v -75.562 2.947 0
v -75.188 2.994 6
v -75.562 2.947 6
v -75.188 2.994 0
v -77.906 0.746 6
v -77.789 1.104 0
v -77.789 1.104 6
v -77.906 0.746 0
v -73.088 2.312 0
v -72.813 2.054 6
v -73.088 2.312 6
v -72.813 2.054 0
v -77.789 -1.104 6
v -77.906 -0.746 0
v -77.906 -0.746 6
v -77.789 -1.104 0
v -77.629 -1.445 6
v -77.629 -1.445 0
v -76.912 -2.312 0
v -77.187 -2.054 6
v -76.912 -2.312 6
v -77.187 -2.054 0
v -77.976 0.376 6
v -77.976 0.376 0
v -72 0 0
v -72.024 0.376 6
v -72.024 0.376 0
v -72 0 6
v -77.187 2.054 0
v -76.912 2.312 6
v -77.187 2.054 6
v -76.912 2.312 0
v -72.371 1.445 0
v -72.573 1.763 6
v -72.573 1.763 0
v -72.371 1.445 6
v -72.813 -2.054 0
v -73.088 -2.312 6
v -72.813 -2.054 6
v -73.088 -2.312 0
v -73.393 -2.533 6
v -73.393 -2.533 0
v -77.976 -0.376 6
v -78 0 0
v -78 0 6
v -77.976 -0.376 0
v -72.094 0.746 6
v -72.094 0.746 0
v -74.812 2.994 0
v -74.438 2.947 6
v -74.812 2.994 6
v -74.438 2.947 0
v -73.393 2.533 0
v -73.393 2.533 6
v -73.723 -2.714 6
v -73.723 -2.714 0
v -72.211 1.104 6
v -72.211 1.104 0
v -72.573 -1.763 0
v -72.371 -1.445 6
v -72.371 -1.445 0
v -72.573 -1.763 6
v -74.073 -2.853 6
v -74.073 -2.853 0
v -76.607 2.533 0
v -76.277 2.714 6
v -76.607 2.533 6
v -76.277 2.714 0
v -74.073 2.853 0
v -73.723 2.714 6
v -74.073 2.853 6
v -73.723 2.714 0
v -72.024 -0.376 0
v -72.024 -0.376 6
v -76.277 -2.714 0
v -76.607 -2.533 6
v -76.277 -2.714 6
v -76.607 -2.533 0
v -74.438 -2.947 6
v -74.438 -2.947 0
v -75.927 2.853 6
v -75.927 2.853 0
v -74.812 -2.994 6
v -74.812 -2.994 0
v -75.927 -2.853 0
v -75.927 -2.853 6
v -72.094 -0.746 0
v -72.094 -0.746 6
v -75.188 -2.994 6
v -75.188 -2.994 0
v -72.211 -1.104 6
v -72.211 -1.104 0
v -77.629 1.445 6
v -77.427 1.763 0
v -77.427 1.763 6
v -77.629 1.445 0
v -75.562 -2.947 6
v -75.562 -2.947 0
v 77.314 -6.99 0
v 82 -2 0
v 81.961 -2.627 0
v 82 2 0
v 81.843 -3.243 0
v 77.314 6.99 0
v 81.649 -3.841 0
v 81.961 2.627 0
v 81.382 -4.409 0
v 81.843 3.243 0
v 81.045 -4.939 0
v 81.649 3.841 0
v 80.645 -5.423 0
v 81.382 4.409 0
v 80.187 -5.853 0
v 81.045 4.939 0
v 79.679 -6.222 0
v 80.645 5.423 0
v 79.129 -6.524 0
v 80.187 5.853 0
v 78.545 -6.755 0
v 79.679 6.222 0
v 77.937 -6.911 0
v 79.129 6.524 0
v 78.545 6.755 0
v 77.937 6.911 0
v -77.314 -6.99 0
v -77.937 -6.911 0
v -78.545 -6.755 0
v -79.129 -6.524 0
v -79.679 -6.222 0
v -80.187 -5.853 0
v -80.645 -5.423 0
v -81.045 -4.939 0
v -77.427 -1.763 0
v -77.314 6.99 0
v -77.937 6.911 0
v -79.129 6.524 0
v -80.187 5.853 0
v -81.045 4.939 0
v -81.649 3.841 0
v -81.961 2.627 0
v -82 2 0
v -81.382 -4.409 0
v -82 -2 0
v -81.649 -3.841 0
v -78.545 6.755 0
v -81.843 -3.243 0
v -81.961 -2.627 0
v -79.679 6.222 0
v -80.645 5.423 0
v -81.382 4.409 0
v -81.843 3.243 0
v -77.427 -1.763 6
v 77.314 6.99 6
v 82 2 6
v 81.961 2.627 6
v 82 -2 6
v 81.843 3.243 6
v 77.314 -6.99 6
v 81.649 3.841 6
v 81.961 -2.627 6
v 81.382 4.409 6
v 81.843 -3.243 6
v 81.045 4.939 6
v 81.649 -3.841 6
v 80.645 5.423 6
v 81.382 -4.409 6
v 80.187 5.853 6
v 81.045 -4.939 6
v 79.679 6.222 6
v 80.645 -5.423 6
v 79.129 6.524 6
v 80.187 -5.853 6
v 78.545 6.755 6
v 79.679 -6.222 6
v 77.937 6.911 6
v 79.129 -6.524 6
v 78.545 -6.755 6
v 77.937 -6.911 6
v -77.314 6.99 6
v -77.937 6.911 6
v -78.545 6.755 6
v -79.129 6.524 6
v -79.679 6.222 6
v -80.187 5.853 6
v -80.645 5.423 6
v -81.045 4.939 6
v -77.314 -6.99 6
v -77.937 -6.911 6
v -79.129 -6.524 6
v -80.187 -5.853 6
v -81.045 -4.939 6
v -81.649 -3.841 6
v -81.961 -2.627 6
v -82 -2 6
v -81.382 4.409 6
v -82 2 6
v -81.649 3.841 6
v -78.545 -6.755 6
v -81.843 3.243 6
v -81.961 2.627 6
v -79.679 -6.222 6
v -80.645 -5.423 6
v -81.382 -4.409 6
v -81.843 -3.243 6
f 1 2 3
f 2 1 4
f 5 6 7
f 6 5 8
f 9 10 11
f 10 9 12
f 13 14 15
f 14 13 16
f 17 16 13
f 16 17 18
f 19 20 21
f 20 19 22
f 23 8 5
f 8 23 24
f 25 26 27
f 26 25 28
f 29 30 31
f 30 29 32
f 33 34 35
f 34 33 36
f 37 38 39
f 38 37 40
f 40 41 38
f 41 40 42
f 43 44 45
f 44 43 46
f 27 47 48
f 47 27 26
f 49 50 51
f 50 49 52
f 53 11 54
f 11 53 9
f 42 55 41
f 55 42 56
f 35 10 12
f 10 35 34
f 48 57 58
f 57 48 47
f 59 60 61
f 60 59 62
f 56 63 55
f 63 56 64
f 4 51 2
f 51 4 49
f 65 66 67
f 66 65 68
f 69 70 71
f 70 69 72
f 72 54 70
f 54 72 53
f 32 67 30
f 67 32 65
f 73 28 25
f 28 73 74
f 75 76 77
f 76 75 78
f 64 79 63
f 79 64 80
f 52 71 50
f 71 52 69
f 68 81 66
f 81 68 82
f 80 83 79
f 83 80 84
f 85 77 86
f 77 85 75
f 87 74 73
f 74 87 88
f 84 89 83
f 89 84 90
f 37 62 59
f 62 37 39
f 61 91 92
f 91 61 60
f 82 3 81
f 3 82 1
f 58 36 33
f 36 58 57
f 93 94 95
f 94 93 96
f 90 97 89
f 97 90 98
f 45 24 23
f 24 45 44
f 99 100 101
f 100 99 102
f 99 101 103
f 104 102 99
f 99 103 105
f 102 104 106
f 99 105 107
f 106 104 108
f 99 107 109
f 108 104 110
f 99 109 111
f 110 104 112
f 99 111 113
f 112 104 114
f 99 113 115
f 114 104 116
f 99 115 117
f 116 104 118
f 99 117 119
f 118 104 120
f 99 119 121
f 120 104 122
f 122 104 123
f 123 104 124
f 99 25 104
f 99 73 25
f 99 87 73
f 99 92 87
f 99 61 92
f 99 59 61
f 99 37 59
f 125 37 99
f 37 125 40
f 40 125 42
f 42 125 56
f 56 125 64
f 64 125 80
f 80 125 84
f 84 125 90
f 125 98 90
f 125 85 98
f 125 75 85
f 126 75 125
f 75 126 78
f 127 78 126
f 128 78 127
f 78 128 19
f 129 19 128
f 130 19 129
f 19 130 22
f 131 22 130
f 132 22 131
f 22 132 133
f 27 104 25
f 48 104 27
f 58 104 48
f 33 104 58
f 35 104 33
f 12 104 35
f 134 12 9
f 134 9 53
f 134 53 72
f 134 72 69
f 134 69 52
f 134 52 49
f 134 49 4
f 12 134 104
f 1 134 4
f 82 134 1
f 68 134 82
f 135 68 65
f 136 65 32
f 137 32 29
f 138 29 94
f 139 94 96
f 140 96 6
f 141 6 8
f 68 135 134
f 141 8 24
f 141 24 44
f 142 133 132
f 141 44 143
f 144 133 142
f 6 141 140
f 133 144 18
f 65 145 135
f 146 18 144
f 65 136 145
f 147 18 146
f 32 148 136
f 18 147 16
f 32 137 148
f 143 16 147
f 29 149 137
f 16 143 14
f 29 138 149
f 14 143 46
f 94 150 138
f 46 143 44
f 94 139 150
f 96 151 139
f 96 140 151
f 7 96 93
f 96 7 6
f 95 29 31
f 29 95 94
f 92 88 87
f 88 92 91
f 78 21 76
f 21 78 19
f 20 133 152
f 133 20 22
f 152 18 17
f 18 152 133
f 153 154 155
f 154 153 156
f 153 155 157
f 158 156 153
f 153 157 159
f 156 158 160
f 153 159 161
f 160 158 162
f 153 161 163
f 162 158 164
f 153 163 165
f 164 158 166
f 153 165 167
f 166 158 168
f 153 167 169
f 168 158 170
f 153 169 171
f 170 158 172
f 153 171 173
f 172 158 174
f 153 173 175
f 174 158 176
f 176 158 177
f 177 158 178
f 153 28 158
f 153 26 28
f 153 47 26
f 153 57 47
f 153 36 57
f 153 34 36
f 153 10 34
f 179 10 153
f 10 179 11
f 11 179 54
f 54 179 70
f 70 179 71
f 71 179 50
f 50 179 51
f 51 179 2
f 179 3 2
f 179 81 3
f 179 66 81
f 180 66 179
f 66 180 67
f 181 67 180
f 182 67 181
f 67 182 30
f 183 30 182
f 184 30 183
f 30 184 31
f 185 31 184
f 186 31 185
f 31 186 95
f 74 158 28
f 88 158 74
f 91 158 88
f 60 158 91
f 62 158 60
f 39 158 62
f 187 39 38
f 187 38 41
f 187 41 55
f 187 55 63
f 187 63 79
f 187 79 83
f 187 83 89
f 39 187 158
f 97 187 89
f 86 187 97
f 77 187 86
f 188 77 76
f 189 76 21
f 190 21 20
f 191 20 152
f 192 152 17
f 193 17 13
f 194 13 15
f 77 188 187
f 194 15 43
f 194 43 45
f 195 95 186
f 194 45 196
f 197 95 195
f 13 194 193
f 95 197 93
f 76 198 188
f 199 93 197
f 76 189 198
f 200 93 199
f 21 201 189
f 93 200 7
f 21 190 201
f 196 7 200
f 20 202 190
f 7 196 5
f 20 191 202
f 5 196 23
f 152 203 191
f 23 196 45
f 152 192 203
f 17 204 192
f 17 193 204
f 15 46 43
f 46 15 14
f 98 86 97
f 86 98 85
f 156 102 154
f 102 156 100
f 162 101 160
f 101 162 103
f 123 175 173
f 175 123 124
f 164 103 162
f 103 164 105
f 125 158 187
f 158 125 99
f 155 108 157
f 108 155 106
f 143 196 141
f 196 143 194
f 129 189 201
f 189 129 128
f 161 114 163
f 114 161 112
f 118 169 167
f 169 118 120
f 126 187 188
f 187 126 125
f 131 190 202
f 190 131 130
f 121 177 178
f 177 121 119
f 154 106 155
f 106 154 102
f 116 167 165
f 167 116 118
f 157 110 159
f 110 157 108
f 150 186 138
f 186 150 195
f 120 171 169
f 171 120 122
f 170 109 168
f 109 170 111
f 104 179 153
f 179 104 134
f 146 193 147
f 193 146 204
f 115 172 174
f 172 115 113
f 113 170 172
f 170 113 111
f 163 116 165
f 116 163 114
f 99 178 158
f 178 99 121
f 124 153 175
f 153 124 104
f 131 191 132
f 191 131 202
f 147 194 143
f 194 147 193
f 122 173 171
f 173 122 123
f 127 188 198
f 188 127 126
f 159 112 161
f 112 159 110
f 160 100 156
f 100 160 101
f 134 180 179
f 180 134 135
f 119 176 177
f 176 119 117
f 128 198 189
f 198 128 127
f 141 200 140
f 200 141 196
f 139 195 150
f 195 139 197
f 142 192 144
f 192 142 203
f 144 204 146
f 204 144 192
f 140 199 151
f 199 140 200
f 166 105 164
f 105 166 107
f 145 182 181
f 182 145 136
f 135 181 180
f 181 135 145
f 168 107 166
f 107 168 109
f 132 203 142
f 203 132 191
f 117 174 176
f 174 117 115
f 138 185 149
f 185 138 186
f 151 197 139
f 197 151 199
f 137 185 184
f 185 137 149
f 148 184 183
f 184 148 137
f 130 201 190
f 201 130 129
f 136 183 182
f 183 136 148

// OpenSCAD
$fn = 50;


difference() {
	union() {
		hull() {
			translate(v = [-77.0000000000, 2.0000000000, 0]) {
				cylinder(h = 6, r = 5);
			}
			translate(v = [77.0000000000, 2.0000000000, 0]) {
				cylinder(h = 6, r = 5);
			}
			translate(v = [-77.0000000000, -2.0000000000, 0]) {
				cylinder(h = 6, r = 5);
			}
			translate(v = [77.0000000000, -2.0000000000, 0]) {
				cylinder(h = 6, r = 5);
			}
		}
	}
	union() {
		translate(v = [-75.0000000000, 0.0000000000, 0]) {
			cylinder(h = 6, r = 3.0000000000);
		}
		translate(v = [-75.0000000000, 0.0000000000, 0]) {
			cylinder(h = 6, r = 1.5000000000);
		}
		translate(v = [-75.0000000000, 0.0000000000, 0]) {
			cylinder(h = 6, r = 1.5000000000);
		}
		translate(v = [-75.0000000000, 0.0000000000, 0]) {
			cylinder(h = 6, r = 1.5000000000);
		}
	}
}
